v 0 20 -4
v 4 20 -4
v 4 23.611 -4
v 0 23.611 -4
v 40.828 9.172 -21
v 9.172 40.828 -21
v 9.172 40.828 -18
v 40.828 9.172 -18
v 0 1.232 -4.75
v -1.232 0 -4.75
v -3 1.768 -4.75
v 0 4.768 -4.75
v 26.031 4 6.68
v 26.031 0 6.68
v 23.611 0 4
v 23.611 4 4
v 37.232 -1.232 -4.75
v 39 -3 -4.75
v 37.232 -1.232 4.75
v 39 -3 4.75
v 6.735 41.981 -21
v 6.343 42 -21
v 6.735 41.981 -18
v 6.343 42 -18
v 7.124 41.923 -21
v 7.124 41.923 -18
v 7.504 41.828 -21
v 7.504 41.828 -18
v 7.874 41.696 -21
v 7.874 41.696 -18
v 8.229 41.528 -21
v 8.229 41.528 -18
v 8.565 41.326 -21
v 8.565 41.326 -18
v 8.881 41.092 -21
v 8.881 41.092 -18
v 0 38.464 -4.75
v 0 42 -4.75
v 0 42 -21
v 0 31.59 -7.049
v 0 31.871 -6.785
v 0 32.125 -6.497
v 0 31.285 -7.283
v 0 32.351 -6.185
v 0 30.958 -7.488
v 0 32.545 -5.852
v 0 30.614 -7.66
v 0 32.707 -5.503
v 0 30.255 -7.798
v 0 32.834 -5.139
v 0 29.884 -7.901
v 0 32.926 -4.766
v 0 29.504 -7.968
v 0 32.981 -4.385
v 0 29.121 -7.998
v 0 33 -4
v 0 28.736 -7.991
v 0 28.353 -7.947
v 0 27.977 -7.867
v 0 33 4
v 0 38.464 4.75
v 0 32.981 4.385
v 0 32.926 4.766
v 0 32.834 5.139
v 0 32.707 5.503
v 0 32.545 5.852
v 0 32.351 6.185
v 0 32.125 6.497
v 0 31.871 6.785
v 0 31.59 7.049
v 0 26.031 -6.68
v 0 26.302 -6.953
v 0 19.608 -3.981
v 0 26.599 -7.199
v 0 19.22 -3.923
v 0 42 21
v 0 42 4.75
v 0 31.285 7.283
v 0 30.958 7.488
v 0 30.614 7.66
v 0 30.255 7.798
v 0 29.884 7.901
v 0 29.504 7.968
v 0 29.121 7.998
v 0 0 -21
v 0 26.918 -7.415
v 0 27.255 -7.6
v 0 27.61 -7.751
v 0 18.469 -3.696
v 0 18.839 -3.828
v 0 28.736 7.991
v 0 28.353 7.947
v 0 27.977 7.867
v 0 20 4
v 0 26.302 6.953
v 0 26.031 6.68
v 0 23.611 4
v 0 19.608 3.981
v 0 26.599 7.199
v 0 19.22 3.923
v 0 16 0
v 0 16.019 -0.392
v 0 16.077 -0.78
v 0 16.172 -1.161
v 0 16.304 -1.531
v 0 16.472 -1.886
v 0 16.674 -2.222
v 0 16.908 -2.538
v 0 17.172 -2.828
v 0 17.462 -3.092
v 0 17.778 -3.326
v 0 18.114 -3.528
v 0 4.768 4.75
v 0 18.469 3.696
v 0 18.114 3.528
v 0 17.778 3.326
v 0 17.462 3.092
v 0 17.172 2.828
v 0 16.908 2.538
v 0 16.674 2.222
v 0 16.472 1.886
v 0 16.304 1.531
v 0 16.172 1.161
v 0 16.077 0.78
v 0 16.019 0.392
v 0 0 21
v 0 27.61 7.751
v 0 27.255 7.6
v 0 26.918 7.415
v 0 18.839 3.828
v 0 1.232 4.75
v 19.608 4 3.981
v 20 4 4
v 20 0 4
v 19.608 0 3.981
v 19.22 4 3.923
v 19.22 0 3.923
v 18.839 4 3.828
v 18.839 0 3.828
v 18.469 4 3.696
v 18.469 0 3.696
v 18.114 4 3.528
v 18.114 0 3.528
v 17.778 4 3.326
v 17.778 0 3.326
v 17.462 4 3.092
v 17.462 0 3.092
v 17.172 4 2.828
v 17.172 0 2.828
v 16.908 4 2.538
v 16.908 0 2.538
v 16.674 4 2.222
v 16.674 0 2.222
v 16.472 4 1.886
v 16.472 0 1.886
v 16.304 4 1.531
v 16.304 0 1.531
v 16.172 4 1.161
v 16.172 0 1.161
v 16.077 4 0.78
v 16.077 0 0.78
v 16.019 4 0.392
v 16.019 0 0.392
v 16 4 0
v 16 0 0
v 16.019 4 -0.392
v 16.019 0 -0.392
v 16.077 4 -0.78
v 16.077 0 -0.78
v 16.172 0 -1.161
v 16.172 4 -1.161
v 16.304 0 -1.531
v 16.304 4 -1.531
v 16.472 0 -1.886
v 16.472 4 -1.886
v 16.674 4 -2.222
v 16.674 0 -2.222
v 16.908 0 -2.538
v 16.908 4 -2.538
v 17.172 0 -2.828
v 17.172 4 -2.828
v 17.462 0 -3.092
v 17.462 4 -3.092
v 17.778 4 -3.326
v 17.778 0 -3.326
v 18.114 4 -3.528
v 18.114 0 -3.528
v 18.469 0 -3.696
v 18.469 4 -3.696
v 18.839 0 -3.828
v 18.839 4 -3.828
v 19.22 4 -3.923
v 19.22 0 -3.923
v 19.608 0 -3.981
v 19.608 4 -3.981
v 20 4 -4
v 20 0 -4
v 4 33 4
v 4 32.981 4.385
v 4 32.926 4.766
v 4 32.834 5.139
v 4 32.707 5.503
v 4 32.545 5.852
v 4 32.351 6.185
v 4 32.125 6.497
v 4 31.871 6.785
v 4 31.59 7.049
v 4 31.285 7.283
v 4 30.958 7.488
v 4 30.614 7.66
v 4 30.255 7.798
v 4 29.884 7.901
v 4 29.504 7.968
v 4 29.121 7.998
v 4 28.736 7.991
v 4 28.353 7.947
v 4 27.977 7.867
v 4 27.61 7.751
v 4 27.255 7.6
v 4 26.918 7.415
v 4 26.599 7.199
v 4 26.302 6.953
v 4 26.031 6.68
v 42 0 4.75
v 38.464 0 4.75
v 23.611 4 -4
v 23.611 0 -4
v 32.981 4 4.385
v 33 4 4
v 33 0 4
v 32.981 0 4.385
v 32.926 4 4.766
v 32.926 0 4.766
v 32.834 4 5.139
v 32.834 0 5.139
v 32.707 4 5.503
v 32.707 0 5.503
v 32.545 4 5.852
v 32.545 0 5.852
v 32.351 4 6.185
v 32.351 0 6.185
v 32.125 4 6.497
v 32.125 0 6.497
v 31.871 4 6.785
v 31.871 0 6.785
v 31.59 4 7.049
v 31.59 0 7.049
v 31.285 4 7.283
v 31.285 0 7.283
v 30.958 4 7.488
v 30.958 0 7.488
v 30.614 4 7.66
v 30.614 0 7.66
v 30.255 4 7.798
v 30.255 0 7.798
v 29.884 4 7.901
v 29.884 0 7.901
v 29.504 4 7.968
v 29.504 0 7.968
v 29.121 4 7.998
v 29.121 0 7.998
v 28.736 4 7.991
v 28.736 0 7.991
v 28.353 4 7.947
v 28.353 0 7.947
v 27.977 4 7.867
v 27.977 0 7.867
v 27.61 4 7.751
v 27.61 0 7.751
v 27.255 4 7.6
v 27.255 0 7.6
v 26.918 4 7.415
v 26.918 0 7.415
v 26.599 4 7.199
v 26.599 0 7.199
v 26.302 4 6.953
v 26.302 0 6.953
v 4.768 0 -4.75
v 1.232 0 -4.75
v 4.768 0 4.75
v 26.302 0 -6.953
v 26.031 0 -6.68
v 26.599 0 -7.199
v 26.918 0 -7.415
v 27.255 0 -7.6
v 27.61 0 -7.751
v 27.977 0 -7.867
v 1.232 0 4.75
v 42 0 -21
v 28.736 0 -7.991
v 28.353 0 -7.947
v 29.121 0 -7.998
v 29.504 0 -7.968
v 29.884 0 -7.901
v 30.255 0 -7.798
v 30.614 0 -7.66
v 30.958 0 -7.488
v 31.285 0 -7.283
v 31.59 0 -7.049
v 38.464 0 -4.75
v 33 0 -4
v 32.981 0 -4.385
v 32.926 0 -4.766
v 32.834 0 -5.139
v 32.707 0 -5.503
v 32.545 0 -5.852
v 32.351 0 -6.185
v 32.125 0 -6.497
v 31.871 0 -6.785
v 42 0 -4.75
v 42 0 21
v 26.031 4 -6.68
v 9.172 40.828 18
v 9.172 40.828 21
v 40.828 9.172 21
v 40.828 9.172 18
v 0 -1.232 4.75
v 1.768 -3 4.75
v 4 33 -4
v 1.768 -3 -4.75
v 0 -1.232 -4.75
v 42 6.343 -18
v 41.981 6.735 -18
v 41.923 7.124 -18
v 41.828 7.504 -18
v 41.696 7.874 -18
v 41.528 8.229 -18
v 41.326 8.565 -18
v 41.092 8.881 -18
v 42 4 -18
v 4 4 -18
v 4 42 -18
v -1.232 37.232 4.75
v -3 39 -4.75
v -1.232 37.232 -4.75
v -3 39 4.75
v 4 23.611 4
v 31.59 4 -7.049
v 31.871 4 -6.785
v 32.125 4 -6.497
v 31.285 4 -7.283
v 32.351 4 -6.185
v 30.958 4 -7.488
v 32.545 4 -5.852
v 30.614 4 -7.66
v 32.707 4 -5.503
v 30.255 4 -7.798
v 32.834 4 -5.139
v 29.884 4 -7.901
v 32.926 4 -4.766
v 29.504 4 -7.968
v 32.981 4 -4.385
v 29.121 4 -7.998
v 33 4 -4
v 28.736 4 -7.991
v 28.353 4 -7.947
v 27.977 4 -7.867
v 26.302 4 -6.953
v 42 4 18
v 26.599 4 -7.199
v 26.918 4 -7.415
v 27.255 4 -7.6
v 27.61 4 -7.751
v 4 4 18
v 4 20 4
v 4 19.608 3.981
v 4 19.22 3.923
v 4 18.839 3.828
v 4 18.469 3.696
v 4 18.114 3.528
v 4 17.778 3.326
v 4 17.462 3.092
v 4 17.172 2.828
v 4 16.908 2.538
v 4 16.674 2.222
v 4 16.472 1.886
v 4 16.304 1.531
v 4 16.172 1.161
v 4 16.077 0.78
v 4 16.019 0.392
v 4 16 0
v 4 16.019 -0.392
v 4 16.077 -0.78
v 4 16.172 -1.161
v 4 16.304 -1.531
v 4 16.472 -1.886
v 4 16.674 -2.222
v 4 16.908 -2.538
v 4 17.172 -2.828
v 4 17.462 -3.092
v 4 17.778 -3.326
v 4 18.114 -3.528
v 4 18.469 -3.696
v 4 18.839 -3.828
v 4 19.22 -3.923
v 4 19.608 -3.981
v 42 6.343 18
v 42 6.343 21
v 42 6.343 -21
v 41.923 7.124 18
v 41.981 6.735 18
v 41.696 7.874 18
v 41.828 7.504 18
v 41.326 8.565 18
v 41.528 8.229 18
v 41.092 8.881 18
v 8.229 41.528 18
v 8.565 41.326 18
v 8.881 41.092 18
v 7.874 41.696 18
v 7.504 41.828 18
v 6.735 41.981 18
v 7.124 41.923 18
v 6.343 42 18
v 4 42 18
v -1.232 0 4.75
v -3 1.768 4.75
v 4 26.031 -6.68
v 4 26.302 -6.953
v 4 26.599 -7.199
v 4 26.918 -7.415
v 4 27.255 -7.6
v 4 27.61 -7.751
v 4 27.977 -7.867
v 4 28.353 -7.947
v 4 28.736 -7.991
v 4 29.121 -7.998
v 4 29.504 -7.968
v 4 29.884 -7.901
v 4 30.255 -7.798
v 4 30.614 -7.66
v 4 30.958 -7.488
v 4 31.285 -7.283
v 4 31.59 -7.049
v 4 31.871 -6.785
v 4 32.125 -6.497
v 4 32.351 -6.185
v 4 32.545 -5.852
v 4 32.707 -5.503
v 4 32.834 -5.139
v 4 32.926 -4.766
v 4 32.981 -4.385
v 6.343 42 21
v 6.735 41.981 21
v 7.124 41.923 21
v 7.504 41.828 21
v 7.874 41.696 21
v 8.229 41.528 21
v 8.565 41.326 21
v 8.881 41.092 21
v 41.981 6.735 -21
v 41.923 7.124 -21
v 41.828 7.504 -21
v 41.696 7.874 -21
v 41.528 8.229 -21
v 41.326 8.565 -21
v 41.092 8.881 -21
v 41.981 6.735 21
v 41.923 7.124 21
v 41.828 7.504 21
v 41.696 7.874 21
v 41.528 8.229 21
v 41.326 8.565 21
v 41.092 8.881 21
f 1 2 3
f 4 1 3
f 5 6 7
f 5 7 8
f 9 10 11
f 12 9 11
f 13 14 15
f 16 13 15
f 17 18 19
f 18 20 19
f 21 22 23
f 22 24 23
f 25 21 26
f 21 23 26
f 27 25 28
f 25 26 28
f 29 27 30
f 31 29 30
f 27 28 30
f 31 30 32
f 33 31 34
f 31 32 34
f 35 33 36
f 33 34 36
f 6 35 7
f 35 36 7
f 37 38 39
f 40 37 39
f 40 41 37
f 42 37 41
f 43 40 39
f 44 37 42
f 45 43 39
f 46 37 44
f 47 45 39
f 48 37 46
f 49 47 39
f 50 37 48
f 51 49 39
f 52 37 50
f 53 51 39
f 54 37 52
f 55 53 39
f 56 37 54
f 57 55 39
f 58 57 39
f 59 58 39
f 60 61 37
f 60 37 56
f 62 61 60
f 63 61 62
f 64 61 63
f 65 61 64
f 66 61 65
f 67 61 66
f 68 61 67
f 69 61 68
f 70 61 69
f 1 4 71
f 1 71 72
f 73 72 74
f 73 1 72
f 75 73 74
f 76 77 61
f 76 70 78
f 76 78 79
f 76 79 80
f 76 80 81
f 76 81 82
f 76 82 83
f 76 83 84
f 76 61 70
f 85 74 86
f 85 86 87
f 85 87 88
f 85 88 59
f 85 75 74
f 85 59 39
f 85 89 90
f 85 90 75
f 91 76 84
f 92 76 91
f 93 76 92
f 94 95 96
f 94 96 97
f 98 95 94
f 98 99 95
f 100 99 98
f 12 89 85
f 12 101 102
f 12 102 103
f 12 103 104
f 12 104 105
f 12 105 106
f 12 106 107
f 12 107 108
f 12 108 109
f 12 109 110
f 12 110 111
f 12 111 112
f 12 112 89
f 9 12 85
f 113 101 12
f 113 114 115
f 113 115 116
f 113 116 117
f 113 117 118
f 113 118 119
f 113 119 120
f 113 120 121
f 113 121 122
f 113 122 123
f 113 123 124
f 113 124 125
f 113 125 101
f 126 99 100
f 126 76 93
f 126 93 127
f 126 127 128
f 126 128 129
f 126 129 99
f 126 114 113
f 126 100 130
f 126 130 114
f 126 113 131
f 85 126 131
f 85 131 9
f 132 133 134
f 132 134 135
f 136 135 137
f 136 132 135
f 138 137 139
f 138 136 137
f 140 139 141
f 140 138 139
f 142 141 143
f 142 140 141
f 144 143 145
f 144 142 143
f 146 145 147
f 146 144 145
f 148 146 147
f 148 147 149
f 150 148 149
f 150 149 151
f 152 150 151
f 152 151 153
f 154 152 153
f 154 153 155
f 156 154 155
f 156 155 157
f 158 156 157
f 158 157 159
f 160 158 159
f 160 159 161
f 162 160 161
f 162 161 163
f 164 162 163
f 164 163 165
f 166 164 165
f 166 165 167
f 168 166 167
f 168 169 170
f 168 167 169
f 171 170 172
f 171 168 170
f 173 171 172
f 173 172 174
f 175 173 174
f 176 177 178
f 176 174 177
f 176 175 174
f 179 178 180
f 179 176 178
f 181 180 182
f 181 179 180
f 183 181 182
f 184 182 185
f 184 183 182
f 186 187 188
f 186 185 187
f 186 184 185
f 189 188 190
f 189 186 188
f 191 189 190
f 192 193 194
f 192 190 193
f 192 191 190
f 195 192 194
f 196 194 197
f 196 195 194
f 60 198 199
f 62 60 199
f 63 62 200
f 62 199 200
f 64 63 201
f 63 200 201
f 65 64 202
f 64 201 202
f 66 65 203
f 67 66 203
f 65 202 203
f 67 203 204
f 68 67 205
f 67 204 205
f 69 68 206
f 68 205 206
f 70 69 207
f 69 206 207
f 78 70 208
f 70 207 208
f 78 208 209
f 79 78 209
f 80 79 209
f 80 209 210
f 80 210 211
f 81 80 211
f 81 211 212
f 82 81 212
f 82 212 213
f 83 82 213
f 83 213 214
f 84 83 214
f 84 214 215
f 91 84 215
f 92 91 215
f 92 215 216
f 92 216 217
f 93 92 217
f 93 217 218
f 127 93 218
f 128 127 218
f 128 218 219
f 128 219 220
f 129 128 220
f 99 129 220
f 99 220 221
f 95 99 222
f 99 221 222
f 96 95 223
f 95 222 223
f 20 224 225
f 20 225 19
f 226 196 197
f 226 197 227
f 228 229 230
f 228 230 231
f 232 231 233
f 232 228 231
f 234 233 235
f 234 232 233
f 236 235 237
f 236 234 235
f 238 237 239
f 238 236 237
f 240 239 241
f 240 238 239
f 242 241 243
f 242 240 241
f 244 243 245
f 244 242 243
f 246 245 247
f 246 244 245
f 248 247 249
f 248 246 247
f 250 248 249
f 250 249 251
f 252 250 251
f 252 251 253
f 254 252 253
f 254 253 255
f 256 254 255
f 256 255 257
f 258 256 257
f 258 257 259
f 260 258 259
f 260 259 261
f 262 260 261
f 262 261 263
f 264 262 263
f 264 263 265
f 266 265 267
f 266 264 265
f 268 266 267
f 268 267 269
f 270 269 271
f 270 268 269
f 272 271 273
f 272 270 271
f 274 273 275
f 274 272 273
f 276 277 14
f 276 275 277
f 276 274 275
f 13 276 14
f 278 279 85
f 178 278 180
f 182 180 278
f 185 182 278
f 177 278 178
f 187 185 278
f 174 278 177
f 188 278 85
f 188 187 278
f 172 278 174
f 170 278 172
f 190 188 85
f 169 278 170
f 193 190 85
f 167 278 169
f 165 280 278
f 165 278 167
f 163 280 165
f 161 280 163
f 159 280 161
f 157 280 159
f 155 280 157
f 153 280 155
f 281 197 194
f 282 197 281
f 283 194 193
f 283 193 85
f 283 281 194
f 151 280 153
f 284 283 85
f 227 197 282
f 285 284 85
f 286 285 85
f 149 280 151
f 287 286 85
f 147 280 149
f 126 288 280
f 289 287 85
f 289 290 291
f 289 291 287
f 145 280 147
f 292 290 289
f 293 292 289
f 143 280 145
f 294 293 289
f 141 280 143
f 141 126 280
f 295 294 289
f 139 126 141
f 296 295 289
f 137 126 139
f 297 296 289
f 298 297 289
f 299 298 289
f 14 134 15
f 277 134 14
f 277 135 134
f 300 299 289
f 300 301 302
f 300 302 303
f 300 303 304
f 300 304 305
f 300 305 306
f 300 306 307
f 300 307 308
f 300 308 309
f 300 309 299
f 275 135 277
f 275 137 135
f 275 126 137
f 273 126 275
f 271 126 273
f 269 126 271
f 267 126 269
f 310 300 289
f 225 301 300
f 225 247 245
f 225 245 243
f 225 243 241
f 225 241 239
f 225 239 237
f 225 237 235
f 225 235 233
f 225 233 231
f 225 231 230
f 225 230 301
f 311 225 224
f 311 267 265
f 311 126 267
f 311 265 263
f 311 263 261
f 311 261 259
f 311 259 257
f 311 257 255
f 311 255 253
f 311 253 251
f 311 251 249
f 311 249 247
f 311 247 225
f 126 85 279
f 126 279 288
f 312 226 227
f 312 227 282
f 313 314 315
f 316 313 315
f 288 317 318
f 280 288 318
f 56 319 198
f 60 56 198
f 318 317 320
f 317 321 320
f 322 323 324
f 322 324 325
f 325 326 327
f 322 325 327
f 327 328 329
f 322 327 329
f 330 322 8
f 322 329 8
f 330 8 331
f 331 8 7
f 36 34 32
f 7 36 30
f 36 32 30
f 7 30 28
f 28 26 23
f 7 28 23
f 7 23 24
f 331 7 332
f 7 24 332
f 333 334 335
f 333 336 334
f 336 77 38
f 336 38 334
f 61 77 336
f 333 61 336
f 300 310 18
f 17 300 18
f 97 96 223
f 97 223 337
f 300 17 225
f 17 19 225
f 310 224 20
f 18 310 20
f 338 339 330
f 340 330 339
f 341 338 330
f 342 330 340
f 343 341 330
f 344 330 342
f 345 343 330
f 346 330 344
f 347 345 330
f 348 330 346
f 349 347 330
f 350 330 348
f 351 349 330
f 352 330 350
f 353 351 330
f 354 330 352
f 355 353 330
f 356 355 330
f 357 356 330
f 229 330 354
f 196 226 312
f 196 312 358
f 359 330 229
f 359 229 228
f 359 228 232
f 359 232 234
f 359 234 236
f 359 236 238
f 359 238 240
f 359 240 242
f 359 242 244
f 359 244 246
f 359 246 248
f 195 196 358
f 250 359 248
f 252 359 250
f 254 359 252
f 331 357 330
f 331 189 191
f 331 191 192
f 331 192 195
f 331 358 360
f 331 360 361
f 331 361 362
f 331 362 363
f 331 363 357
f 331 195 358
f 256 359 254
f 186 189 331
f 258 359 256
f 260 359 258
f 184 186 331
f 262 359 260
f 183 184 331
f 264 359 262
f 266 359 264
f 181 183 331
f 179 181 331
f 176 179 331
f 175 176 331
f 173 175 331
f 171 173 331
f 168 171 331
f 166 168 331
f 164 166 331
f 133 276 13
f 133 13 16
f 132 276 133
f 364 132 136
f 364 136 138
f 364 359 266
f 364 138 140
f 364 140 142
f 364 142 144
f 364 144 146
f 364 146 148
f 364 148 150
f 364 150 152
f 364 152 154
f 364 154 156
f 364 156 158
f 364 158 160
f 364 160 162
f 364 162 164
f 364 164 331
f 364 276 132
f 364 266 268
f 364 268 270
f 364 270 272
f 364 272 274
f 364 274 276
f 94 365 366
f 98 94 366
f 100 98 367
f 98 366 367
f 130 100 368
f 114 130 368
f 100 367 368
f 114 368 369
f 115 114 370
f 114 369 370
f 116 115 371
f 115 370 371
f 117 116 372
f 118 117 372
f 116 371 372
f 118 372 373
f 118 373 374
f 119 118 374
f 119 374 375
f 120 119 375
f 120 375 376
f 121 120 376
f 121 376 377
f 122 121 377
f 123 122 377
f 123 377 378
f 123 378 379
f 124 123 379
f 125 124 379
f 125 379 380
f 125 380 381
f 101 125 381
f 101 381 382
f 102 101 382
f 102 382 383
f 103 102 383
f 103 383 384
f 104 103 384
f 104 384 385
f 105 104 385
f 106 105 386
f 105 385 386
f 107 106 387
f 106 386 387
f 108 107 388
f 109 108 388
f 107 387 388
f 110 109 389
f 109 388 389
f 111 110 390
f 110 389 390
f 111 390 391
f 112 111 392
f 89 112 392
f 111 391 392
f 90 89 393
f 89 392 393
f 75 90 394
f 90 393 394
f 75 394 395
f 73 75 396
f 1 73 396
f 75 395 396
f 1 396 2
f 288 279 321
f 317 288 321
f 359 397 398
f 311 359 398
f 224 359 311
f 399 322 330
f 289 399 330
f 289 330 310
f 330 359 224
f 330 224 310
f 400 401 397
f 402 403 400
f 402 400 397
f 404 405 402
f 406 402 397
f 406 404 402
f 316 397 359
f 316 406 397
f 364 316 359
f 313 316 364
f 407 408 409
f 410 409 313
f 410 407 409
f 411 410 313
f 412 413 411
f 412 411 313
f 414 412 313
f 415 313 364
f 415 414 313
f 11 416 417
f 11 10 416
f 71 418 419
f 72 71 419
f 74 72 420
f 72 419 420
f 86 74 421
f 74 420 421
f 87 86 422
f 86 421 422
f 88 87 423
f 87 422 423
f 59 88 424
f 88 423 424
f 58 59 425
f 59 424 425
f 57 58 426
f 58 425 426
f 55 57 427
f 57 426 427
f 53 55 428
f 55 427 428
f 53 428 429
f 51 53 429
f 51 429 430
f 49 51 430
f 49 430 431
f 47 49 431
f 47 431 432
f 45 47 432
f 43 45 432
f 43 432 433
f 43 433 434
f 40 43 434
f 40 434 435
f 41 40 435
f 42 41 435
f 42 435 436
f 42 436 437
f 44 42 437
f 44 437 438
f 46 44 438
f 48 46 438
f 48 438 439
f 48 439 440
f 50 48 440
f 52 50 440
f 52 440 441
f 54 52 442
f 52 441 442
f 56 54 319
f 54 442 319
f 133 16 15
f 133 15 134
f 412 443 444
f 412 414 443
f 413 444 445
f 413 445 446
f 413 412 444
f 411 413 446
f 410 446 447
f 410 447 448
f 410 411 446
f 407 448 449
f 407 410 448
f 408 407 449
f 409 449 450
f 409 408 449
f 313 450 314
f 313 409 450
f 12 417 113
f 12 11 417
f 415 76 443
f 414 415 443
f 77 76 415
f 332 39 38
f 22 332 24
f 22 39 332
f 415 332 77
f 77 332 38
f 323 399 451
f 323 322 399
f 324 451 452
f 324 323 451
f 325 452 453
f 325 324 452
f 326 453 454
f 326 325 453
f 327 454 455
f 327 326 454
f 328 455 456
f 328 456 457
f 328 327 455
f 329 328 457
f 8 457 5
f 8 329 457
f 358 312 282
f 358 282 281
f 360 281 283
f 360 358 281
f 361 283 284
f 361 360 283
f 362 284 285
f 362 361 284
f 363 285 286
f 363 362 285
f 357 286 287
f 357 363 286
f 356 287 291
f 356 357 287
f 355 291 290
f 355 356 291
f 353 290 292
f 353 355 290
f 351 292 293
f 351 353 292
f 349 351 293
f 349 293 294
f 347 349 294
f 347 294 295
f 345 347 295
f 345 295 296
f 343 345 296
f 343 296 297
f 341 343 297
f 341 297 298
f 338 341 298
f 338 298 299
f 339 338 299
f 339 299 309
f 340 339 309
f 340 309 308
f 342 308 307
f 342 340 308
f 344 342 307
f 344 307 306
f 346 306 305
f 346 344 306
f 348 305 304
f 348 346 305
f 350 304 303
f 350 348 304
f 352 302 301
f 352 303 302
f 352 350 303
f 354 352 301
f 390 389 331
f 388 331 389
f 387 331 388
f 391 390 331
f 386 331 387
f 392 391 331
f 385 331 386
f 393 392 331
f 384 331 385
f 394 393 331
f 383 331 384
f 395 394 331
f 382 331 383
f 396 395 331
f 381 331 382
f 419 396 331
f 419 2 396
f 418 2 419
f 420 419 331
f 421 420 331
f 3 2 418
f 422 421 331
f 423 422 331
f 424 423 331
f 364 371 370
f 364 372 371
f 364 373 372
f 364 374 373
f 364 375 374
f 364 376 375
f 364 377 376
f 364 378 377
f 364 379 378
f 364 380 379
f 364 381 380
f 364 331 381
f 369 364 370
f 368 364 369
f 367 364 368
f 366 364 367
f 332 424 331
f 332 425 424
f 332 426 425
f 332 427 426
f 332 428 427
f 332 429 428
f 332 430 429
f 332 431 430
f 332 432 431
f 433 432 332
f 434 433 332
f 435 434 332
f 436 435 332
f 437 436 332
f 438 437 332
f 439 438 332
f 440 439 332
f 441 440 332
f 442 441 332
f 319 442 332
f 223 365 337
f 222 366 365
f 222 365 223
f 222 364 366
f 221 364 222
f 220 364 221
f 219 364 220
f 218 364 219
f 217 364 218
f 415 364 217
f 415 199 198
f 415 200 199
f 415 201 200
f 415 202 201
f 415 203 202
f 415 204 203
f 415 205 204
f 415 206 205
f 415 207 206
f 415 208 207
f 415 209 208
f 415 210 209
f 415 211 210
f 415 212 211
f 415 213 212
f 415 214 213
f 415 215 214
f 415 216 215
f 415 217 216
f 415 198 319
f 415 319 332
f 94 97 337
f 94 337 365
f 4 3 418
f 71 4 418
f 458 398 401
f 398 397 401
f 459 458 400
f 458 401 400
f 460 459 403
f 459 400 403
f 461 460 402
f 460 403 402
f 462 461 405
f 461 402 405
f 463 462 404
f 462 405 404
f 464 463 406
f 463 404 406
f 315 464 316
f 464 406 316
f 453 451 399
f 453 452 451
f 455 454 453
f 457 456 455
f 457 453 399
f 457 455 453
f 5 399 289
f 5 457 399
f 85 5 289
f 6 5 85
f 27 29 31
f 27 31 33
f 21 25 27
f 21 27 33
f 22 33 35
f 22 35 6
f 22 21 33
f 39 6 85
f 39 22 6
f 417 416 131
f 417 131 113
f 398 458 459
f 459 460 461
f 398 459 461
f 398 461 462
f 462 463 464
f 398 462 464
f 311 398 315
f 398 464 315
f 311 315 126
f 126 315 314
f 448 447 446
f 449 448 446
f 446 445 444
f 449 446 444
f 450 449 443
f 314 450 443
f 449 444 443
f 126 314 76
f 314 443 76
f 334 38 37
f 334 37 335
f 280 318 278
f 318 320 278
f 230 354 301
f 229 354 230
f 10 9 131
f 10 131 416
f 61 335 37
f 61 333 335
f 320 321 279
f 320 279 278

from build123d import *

# Parameters (mm, degrees)
EXTRUDE_1_DEPTH        = 21
EXTRUDE_2_DEPTH        = 3
FILLET_1_R             = 4
FILLET_1_OF_MIRROR_2_R = 4
CUT_EXTRUDE_1_DEPTH    = 5
EXTRUDE_3_DEPTH        = 4.75


with BuildPart() as part:
    # Эскиз1 → Бобышка-Вытянуть1 (new body, symmetric)
    with BuildSketch(Plane.XY):
        Polygon((0, 42), (0, 0), (42, 0), (42, 4), (4, 4), (4, 42), align=None)
    extrude(amount=EXTRUDE_1_DEPTH, both=True)

    # Эскиз2 → Бобышка-Вытянуть2 (add)
    with BuildSketch(Plane.XY.offset(21)):
        Polygon((42, 4), (4, 4), (4, 42), (8, 42), (42, 8), align=None)
    extrude_2 = extrude(amount=-EXTRUDE_2_DEPTH)

    # Скругление1
    fillet_1_edges = [part.edges().sort_by_distance(p)[0] for p in [
        (8, 42, 19.5),
        (42, 8, 19.5),
    ]]
    fillet(fillet_1_edges, radius=FILLET_1_R)

    # Зеркальное отражение2: Бобышка-Вытянуть2 across plane
    add(extrude_2.mirror(Plane.XY))

    # Скругление1 of Зеркальное отражение2
    fillet_1_of_mirror_2_edges = [part.edges().sort_by_distance(p)[0] for p in [
        (8, 42, -19.5),
        (42, 8, -19.5),
    ]]
    fillet(fillet_1_of_mirror_2_edges, radius=FILLET_1_OF_MIRROR_2_R)

    # Эскиз3 → Вырез-Вытянуть1 (cut, through all)
    with BuildSketch(Plane(origin=(0, 4, 0), x_dir=(1, 0, 0), z_dir=(0, 1, 0))):
        with BuildLine():
            Line((20, 4), (23.611111111, 4))
            Line((23.611111111, 4), (26.030927835, 6.680412371))
            ThreePointArc((26.030927835, 6.680412371), (30.435916317, 7.733382425), (33, 4))
            Line((33, 4), (33, -4))
            ThreePointArc((33, -4), (30.435916317, -7.733382425), (26.030927835, -6.680412371))
            Line((26.030927835, -6.680412371), (23.611111111, -4))
            Line((23.611111111, -4), (20, -4))
            ThreePointArc((20, -4), (16, 0), (20, 4))
        make_face()
    cut_extrude_1 = extrude(amount=-CUT_EXTRUDE_1_DEPTH, mode=Mode.SUBTRACT)

    # Эскиз4 → Бобышка-Вытянуть3 (add, symmetric)
    with BuildSketch(Plane.XY):
        Polygon((1.232233047, 0), (0, -1.232233047), (1.767766953, -3), (4.767766953, 0), align=None)
        Polygon((42, 0), (39, -3), (37.232233047, -1.232233047), (38.464466094, 0), align=None)
    extrude_3 = extrude(amount=EXTRUDE_3_DEPTH, both=True)

    # Зеркальное отражение3: Вырез-Вытянуть1, Бобышка-Вытянуть3 across plane
    add(cut_extrude_1.mirror(Plane(origin=(0, 0, 0), x_dir=(0, 0, 1), z_dir=(-0.707106781, 0.707106781, 0))), mode=Mode.SUBTRACT)
    add(extrude_3.mirror(Plane(origin=(0, 0, 0), x_dir=(0, 0, 1), z_dir=(-0.707106781, 0.707106781, 0))))


solid = part.part
